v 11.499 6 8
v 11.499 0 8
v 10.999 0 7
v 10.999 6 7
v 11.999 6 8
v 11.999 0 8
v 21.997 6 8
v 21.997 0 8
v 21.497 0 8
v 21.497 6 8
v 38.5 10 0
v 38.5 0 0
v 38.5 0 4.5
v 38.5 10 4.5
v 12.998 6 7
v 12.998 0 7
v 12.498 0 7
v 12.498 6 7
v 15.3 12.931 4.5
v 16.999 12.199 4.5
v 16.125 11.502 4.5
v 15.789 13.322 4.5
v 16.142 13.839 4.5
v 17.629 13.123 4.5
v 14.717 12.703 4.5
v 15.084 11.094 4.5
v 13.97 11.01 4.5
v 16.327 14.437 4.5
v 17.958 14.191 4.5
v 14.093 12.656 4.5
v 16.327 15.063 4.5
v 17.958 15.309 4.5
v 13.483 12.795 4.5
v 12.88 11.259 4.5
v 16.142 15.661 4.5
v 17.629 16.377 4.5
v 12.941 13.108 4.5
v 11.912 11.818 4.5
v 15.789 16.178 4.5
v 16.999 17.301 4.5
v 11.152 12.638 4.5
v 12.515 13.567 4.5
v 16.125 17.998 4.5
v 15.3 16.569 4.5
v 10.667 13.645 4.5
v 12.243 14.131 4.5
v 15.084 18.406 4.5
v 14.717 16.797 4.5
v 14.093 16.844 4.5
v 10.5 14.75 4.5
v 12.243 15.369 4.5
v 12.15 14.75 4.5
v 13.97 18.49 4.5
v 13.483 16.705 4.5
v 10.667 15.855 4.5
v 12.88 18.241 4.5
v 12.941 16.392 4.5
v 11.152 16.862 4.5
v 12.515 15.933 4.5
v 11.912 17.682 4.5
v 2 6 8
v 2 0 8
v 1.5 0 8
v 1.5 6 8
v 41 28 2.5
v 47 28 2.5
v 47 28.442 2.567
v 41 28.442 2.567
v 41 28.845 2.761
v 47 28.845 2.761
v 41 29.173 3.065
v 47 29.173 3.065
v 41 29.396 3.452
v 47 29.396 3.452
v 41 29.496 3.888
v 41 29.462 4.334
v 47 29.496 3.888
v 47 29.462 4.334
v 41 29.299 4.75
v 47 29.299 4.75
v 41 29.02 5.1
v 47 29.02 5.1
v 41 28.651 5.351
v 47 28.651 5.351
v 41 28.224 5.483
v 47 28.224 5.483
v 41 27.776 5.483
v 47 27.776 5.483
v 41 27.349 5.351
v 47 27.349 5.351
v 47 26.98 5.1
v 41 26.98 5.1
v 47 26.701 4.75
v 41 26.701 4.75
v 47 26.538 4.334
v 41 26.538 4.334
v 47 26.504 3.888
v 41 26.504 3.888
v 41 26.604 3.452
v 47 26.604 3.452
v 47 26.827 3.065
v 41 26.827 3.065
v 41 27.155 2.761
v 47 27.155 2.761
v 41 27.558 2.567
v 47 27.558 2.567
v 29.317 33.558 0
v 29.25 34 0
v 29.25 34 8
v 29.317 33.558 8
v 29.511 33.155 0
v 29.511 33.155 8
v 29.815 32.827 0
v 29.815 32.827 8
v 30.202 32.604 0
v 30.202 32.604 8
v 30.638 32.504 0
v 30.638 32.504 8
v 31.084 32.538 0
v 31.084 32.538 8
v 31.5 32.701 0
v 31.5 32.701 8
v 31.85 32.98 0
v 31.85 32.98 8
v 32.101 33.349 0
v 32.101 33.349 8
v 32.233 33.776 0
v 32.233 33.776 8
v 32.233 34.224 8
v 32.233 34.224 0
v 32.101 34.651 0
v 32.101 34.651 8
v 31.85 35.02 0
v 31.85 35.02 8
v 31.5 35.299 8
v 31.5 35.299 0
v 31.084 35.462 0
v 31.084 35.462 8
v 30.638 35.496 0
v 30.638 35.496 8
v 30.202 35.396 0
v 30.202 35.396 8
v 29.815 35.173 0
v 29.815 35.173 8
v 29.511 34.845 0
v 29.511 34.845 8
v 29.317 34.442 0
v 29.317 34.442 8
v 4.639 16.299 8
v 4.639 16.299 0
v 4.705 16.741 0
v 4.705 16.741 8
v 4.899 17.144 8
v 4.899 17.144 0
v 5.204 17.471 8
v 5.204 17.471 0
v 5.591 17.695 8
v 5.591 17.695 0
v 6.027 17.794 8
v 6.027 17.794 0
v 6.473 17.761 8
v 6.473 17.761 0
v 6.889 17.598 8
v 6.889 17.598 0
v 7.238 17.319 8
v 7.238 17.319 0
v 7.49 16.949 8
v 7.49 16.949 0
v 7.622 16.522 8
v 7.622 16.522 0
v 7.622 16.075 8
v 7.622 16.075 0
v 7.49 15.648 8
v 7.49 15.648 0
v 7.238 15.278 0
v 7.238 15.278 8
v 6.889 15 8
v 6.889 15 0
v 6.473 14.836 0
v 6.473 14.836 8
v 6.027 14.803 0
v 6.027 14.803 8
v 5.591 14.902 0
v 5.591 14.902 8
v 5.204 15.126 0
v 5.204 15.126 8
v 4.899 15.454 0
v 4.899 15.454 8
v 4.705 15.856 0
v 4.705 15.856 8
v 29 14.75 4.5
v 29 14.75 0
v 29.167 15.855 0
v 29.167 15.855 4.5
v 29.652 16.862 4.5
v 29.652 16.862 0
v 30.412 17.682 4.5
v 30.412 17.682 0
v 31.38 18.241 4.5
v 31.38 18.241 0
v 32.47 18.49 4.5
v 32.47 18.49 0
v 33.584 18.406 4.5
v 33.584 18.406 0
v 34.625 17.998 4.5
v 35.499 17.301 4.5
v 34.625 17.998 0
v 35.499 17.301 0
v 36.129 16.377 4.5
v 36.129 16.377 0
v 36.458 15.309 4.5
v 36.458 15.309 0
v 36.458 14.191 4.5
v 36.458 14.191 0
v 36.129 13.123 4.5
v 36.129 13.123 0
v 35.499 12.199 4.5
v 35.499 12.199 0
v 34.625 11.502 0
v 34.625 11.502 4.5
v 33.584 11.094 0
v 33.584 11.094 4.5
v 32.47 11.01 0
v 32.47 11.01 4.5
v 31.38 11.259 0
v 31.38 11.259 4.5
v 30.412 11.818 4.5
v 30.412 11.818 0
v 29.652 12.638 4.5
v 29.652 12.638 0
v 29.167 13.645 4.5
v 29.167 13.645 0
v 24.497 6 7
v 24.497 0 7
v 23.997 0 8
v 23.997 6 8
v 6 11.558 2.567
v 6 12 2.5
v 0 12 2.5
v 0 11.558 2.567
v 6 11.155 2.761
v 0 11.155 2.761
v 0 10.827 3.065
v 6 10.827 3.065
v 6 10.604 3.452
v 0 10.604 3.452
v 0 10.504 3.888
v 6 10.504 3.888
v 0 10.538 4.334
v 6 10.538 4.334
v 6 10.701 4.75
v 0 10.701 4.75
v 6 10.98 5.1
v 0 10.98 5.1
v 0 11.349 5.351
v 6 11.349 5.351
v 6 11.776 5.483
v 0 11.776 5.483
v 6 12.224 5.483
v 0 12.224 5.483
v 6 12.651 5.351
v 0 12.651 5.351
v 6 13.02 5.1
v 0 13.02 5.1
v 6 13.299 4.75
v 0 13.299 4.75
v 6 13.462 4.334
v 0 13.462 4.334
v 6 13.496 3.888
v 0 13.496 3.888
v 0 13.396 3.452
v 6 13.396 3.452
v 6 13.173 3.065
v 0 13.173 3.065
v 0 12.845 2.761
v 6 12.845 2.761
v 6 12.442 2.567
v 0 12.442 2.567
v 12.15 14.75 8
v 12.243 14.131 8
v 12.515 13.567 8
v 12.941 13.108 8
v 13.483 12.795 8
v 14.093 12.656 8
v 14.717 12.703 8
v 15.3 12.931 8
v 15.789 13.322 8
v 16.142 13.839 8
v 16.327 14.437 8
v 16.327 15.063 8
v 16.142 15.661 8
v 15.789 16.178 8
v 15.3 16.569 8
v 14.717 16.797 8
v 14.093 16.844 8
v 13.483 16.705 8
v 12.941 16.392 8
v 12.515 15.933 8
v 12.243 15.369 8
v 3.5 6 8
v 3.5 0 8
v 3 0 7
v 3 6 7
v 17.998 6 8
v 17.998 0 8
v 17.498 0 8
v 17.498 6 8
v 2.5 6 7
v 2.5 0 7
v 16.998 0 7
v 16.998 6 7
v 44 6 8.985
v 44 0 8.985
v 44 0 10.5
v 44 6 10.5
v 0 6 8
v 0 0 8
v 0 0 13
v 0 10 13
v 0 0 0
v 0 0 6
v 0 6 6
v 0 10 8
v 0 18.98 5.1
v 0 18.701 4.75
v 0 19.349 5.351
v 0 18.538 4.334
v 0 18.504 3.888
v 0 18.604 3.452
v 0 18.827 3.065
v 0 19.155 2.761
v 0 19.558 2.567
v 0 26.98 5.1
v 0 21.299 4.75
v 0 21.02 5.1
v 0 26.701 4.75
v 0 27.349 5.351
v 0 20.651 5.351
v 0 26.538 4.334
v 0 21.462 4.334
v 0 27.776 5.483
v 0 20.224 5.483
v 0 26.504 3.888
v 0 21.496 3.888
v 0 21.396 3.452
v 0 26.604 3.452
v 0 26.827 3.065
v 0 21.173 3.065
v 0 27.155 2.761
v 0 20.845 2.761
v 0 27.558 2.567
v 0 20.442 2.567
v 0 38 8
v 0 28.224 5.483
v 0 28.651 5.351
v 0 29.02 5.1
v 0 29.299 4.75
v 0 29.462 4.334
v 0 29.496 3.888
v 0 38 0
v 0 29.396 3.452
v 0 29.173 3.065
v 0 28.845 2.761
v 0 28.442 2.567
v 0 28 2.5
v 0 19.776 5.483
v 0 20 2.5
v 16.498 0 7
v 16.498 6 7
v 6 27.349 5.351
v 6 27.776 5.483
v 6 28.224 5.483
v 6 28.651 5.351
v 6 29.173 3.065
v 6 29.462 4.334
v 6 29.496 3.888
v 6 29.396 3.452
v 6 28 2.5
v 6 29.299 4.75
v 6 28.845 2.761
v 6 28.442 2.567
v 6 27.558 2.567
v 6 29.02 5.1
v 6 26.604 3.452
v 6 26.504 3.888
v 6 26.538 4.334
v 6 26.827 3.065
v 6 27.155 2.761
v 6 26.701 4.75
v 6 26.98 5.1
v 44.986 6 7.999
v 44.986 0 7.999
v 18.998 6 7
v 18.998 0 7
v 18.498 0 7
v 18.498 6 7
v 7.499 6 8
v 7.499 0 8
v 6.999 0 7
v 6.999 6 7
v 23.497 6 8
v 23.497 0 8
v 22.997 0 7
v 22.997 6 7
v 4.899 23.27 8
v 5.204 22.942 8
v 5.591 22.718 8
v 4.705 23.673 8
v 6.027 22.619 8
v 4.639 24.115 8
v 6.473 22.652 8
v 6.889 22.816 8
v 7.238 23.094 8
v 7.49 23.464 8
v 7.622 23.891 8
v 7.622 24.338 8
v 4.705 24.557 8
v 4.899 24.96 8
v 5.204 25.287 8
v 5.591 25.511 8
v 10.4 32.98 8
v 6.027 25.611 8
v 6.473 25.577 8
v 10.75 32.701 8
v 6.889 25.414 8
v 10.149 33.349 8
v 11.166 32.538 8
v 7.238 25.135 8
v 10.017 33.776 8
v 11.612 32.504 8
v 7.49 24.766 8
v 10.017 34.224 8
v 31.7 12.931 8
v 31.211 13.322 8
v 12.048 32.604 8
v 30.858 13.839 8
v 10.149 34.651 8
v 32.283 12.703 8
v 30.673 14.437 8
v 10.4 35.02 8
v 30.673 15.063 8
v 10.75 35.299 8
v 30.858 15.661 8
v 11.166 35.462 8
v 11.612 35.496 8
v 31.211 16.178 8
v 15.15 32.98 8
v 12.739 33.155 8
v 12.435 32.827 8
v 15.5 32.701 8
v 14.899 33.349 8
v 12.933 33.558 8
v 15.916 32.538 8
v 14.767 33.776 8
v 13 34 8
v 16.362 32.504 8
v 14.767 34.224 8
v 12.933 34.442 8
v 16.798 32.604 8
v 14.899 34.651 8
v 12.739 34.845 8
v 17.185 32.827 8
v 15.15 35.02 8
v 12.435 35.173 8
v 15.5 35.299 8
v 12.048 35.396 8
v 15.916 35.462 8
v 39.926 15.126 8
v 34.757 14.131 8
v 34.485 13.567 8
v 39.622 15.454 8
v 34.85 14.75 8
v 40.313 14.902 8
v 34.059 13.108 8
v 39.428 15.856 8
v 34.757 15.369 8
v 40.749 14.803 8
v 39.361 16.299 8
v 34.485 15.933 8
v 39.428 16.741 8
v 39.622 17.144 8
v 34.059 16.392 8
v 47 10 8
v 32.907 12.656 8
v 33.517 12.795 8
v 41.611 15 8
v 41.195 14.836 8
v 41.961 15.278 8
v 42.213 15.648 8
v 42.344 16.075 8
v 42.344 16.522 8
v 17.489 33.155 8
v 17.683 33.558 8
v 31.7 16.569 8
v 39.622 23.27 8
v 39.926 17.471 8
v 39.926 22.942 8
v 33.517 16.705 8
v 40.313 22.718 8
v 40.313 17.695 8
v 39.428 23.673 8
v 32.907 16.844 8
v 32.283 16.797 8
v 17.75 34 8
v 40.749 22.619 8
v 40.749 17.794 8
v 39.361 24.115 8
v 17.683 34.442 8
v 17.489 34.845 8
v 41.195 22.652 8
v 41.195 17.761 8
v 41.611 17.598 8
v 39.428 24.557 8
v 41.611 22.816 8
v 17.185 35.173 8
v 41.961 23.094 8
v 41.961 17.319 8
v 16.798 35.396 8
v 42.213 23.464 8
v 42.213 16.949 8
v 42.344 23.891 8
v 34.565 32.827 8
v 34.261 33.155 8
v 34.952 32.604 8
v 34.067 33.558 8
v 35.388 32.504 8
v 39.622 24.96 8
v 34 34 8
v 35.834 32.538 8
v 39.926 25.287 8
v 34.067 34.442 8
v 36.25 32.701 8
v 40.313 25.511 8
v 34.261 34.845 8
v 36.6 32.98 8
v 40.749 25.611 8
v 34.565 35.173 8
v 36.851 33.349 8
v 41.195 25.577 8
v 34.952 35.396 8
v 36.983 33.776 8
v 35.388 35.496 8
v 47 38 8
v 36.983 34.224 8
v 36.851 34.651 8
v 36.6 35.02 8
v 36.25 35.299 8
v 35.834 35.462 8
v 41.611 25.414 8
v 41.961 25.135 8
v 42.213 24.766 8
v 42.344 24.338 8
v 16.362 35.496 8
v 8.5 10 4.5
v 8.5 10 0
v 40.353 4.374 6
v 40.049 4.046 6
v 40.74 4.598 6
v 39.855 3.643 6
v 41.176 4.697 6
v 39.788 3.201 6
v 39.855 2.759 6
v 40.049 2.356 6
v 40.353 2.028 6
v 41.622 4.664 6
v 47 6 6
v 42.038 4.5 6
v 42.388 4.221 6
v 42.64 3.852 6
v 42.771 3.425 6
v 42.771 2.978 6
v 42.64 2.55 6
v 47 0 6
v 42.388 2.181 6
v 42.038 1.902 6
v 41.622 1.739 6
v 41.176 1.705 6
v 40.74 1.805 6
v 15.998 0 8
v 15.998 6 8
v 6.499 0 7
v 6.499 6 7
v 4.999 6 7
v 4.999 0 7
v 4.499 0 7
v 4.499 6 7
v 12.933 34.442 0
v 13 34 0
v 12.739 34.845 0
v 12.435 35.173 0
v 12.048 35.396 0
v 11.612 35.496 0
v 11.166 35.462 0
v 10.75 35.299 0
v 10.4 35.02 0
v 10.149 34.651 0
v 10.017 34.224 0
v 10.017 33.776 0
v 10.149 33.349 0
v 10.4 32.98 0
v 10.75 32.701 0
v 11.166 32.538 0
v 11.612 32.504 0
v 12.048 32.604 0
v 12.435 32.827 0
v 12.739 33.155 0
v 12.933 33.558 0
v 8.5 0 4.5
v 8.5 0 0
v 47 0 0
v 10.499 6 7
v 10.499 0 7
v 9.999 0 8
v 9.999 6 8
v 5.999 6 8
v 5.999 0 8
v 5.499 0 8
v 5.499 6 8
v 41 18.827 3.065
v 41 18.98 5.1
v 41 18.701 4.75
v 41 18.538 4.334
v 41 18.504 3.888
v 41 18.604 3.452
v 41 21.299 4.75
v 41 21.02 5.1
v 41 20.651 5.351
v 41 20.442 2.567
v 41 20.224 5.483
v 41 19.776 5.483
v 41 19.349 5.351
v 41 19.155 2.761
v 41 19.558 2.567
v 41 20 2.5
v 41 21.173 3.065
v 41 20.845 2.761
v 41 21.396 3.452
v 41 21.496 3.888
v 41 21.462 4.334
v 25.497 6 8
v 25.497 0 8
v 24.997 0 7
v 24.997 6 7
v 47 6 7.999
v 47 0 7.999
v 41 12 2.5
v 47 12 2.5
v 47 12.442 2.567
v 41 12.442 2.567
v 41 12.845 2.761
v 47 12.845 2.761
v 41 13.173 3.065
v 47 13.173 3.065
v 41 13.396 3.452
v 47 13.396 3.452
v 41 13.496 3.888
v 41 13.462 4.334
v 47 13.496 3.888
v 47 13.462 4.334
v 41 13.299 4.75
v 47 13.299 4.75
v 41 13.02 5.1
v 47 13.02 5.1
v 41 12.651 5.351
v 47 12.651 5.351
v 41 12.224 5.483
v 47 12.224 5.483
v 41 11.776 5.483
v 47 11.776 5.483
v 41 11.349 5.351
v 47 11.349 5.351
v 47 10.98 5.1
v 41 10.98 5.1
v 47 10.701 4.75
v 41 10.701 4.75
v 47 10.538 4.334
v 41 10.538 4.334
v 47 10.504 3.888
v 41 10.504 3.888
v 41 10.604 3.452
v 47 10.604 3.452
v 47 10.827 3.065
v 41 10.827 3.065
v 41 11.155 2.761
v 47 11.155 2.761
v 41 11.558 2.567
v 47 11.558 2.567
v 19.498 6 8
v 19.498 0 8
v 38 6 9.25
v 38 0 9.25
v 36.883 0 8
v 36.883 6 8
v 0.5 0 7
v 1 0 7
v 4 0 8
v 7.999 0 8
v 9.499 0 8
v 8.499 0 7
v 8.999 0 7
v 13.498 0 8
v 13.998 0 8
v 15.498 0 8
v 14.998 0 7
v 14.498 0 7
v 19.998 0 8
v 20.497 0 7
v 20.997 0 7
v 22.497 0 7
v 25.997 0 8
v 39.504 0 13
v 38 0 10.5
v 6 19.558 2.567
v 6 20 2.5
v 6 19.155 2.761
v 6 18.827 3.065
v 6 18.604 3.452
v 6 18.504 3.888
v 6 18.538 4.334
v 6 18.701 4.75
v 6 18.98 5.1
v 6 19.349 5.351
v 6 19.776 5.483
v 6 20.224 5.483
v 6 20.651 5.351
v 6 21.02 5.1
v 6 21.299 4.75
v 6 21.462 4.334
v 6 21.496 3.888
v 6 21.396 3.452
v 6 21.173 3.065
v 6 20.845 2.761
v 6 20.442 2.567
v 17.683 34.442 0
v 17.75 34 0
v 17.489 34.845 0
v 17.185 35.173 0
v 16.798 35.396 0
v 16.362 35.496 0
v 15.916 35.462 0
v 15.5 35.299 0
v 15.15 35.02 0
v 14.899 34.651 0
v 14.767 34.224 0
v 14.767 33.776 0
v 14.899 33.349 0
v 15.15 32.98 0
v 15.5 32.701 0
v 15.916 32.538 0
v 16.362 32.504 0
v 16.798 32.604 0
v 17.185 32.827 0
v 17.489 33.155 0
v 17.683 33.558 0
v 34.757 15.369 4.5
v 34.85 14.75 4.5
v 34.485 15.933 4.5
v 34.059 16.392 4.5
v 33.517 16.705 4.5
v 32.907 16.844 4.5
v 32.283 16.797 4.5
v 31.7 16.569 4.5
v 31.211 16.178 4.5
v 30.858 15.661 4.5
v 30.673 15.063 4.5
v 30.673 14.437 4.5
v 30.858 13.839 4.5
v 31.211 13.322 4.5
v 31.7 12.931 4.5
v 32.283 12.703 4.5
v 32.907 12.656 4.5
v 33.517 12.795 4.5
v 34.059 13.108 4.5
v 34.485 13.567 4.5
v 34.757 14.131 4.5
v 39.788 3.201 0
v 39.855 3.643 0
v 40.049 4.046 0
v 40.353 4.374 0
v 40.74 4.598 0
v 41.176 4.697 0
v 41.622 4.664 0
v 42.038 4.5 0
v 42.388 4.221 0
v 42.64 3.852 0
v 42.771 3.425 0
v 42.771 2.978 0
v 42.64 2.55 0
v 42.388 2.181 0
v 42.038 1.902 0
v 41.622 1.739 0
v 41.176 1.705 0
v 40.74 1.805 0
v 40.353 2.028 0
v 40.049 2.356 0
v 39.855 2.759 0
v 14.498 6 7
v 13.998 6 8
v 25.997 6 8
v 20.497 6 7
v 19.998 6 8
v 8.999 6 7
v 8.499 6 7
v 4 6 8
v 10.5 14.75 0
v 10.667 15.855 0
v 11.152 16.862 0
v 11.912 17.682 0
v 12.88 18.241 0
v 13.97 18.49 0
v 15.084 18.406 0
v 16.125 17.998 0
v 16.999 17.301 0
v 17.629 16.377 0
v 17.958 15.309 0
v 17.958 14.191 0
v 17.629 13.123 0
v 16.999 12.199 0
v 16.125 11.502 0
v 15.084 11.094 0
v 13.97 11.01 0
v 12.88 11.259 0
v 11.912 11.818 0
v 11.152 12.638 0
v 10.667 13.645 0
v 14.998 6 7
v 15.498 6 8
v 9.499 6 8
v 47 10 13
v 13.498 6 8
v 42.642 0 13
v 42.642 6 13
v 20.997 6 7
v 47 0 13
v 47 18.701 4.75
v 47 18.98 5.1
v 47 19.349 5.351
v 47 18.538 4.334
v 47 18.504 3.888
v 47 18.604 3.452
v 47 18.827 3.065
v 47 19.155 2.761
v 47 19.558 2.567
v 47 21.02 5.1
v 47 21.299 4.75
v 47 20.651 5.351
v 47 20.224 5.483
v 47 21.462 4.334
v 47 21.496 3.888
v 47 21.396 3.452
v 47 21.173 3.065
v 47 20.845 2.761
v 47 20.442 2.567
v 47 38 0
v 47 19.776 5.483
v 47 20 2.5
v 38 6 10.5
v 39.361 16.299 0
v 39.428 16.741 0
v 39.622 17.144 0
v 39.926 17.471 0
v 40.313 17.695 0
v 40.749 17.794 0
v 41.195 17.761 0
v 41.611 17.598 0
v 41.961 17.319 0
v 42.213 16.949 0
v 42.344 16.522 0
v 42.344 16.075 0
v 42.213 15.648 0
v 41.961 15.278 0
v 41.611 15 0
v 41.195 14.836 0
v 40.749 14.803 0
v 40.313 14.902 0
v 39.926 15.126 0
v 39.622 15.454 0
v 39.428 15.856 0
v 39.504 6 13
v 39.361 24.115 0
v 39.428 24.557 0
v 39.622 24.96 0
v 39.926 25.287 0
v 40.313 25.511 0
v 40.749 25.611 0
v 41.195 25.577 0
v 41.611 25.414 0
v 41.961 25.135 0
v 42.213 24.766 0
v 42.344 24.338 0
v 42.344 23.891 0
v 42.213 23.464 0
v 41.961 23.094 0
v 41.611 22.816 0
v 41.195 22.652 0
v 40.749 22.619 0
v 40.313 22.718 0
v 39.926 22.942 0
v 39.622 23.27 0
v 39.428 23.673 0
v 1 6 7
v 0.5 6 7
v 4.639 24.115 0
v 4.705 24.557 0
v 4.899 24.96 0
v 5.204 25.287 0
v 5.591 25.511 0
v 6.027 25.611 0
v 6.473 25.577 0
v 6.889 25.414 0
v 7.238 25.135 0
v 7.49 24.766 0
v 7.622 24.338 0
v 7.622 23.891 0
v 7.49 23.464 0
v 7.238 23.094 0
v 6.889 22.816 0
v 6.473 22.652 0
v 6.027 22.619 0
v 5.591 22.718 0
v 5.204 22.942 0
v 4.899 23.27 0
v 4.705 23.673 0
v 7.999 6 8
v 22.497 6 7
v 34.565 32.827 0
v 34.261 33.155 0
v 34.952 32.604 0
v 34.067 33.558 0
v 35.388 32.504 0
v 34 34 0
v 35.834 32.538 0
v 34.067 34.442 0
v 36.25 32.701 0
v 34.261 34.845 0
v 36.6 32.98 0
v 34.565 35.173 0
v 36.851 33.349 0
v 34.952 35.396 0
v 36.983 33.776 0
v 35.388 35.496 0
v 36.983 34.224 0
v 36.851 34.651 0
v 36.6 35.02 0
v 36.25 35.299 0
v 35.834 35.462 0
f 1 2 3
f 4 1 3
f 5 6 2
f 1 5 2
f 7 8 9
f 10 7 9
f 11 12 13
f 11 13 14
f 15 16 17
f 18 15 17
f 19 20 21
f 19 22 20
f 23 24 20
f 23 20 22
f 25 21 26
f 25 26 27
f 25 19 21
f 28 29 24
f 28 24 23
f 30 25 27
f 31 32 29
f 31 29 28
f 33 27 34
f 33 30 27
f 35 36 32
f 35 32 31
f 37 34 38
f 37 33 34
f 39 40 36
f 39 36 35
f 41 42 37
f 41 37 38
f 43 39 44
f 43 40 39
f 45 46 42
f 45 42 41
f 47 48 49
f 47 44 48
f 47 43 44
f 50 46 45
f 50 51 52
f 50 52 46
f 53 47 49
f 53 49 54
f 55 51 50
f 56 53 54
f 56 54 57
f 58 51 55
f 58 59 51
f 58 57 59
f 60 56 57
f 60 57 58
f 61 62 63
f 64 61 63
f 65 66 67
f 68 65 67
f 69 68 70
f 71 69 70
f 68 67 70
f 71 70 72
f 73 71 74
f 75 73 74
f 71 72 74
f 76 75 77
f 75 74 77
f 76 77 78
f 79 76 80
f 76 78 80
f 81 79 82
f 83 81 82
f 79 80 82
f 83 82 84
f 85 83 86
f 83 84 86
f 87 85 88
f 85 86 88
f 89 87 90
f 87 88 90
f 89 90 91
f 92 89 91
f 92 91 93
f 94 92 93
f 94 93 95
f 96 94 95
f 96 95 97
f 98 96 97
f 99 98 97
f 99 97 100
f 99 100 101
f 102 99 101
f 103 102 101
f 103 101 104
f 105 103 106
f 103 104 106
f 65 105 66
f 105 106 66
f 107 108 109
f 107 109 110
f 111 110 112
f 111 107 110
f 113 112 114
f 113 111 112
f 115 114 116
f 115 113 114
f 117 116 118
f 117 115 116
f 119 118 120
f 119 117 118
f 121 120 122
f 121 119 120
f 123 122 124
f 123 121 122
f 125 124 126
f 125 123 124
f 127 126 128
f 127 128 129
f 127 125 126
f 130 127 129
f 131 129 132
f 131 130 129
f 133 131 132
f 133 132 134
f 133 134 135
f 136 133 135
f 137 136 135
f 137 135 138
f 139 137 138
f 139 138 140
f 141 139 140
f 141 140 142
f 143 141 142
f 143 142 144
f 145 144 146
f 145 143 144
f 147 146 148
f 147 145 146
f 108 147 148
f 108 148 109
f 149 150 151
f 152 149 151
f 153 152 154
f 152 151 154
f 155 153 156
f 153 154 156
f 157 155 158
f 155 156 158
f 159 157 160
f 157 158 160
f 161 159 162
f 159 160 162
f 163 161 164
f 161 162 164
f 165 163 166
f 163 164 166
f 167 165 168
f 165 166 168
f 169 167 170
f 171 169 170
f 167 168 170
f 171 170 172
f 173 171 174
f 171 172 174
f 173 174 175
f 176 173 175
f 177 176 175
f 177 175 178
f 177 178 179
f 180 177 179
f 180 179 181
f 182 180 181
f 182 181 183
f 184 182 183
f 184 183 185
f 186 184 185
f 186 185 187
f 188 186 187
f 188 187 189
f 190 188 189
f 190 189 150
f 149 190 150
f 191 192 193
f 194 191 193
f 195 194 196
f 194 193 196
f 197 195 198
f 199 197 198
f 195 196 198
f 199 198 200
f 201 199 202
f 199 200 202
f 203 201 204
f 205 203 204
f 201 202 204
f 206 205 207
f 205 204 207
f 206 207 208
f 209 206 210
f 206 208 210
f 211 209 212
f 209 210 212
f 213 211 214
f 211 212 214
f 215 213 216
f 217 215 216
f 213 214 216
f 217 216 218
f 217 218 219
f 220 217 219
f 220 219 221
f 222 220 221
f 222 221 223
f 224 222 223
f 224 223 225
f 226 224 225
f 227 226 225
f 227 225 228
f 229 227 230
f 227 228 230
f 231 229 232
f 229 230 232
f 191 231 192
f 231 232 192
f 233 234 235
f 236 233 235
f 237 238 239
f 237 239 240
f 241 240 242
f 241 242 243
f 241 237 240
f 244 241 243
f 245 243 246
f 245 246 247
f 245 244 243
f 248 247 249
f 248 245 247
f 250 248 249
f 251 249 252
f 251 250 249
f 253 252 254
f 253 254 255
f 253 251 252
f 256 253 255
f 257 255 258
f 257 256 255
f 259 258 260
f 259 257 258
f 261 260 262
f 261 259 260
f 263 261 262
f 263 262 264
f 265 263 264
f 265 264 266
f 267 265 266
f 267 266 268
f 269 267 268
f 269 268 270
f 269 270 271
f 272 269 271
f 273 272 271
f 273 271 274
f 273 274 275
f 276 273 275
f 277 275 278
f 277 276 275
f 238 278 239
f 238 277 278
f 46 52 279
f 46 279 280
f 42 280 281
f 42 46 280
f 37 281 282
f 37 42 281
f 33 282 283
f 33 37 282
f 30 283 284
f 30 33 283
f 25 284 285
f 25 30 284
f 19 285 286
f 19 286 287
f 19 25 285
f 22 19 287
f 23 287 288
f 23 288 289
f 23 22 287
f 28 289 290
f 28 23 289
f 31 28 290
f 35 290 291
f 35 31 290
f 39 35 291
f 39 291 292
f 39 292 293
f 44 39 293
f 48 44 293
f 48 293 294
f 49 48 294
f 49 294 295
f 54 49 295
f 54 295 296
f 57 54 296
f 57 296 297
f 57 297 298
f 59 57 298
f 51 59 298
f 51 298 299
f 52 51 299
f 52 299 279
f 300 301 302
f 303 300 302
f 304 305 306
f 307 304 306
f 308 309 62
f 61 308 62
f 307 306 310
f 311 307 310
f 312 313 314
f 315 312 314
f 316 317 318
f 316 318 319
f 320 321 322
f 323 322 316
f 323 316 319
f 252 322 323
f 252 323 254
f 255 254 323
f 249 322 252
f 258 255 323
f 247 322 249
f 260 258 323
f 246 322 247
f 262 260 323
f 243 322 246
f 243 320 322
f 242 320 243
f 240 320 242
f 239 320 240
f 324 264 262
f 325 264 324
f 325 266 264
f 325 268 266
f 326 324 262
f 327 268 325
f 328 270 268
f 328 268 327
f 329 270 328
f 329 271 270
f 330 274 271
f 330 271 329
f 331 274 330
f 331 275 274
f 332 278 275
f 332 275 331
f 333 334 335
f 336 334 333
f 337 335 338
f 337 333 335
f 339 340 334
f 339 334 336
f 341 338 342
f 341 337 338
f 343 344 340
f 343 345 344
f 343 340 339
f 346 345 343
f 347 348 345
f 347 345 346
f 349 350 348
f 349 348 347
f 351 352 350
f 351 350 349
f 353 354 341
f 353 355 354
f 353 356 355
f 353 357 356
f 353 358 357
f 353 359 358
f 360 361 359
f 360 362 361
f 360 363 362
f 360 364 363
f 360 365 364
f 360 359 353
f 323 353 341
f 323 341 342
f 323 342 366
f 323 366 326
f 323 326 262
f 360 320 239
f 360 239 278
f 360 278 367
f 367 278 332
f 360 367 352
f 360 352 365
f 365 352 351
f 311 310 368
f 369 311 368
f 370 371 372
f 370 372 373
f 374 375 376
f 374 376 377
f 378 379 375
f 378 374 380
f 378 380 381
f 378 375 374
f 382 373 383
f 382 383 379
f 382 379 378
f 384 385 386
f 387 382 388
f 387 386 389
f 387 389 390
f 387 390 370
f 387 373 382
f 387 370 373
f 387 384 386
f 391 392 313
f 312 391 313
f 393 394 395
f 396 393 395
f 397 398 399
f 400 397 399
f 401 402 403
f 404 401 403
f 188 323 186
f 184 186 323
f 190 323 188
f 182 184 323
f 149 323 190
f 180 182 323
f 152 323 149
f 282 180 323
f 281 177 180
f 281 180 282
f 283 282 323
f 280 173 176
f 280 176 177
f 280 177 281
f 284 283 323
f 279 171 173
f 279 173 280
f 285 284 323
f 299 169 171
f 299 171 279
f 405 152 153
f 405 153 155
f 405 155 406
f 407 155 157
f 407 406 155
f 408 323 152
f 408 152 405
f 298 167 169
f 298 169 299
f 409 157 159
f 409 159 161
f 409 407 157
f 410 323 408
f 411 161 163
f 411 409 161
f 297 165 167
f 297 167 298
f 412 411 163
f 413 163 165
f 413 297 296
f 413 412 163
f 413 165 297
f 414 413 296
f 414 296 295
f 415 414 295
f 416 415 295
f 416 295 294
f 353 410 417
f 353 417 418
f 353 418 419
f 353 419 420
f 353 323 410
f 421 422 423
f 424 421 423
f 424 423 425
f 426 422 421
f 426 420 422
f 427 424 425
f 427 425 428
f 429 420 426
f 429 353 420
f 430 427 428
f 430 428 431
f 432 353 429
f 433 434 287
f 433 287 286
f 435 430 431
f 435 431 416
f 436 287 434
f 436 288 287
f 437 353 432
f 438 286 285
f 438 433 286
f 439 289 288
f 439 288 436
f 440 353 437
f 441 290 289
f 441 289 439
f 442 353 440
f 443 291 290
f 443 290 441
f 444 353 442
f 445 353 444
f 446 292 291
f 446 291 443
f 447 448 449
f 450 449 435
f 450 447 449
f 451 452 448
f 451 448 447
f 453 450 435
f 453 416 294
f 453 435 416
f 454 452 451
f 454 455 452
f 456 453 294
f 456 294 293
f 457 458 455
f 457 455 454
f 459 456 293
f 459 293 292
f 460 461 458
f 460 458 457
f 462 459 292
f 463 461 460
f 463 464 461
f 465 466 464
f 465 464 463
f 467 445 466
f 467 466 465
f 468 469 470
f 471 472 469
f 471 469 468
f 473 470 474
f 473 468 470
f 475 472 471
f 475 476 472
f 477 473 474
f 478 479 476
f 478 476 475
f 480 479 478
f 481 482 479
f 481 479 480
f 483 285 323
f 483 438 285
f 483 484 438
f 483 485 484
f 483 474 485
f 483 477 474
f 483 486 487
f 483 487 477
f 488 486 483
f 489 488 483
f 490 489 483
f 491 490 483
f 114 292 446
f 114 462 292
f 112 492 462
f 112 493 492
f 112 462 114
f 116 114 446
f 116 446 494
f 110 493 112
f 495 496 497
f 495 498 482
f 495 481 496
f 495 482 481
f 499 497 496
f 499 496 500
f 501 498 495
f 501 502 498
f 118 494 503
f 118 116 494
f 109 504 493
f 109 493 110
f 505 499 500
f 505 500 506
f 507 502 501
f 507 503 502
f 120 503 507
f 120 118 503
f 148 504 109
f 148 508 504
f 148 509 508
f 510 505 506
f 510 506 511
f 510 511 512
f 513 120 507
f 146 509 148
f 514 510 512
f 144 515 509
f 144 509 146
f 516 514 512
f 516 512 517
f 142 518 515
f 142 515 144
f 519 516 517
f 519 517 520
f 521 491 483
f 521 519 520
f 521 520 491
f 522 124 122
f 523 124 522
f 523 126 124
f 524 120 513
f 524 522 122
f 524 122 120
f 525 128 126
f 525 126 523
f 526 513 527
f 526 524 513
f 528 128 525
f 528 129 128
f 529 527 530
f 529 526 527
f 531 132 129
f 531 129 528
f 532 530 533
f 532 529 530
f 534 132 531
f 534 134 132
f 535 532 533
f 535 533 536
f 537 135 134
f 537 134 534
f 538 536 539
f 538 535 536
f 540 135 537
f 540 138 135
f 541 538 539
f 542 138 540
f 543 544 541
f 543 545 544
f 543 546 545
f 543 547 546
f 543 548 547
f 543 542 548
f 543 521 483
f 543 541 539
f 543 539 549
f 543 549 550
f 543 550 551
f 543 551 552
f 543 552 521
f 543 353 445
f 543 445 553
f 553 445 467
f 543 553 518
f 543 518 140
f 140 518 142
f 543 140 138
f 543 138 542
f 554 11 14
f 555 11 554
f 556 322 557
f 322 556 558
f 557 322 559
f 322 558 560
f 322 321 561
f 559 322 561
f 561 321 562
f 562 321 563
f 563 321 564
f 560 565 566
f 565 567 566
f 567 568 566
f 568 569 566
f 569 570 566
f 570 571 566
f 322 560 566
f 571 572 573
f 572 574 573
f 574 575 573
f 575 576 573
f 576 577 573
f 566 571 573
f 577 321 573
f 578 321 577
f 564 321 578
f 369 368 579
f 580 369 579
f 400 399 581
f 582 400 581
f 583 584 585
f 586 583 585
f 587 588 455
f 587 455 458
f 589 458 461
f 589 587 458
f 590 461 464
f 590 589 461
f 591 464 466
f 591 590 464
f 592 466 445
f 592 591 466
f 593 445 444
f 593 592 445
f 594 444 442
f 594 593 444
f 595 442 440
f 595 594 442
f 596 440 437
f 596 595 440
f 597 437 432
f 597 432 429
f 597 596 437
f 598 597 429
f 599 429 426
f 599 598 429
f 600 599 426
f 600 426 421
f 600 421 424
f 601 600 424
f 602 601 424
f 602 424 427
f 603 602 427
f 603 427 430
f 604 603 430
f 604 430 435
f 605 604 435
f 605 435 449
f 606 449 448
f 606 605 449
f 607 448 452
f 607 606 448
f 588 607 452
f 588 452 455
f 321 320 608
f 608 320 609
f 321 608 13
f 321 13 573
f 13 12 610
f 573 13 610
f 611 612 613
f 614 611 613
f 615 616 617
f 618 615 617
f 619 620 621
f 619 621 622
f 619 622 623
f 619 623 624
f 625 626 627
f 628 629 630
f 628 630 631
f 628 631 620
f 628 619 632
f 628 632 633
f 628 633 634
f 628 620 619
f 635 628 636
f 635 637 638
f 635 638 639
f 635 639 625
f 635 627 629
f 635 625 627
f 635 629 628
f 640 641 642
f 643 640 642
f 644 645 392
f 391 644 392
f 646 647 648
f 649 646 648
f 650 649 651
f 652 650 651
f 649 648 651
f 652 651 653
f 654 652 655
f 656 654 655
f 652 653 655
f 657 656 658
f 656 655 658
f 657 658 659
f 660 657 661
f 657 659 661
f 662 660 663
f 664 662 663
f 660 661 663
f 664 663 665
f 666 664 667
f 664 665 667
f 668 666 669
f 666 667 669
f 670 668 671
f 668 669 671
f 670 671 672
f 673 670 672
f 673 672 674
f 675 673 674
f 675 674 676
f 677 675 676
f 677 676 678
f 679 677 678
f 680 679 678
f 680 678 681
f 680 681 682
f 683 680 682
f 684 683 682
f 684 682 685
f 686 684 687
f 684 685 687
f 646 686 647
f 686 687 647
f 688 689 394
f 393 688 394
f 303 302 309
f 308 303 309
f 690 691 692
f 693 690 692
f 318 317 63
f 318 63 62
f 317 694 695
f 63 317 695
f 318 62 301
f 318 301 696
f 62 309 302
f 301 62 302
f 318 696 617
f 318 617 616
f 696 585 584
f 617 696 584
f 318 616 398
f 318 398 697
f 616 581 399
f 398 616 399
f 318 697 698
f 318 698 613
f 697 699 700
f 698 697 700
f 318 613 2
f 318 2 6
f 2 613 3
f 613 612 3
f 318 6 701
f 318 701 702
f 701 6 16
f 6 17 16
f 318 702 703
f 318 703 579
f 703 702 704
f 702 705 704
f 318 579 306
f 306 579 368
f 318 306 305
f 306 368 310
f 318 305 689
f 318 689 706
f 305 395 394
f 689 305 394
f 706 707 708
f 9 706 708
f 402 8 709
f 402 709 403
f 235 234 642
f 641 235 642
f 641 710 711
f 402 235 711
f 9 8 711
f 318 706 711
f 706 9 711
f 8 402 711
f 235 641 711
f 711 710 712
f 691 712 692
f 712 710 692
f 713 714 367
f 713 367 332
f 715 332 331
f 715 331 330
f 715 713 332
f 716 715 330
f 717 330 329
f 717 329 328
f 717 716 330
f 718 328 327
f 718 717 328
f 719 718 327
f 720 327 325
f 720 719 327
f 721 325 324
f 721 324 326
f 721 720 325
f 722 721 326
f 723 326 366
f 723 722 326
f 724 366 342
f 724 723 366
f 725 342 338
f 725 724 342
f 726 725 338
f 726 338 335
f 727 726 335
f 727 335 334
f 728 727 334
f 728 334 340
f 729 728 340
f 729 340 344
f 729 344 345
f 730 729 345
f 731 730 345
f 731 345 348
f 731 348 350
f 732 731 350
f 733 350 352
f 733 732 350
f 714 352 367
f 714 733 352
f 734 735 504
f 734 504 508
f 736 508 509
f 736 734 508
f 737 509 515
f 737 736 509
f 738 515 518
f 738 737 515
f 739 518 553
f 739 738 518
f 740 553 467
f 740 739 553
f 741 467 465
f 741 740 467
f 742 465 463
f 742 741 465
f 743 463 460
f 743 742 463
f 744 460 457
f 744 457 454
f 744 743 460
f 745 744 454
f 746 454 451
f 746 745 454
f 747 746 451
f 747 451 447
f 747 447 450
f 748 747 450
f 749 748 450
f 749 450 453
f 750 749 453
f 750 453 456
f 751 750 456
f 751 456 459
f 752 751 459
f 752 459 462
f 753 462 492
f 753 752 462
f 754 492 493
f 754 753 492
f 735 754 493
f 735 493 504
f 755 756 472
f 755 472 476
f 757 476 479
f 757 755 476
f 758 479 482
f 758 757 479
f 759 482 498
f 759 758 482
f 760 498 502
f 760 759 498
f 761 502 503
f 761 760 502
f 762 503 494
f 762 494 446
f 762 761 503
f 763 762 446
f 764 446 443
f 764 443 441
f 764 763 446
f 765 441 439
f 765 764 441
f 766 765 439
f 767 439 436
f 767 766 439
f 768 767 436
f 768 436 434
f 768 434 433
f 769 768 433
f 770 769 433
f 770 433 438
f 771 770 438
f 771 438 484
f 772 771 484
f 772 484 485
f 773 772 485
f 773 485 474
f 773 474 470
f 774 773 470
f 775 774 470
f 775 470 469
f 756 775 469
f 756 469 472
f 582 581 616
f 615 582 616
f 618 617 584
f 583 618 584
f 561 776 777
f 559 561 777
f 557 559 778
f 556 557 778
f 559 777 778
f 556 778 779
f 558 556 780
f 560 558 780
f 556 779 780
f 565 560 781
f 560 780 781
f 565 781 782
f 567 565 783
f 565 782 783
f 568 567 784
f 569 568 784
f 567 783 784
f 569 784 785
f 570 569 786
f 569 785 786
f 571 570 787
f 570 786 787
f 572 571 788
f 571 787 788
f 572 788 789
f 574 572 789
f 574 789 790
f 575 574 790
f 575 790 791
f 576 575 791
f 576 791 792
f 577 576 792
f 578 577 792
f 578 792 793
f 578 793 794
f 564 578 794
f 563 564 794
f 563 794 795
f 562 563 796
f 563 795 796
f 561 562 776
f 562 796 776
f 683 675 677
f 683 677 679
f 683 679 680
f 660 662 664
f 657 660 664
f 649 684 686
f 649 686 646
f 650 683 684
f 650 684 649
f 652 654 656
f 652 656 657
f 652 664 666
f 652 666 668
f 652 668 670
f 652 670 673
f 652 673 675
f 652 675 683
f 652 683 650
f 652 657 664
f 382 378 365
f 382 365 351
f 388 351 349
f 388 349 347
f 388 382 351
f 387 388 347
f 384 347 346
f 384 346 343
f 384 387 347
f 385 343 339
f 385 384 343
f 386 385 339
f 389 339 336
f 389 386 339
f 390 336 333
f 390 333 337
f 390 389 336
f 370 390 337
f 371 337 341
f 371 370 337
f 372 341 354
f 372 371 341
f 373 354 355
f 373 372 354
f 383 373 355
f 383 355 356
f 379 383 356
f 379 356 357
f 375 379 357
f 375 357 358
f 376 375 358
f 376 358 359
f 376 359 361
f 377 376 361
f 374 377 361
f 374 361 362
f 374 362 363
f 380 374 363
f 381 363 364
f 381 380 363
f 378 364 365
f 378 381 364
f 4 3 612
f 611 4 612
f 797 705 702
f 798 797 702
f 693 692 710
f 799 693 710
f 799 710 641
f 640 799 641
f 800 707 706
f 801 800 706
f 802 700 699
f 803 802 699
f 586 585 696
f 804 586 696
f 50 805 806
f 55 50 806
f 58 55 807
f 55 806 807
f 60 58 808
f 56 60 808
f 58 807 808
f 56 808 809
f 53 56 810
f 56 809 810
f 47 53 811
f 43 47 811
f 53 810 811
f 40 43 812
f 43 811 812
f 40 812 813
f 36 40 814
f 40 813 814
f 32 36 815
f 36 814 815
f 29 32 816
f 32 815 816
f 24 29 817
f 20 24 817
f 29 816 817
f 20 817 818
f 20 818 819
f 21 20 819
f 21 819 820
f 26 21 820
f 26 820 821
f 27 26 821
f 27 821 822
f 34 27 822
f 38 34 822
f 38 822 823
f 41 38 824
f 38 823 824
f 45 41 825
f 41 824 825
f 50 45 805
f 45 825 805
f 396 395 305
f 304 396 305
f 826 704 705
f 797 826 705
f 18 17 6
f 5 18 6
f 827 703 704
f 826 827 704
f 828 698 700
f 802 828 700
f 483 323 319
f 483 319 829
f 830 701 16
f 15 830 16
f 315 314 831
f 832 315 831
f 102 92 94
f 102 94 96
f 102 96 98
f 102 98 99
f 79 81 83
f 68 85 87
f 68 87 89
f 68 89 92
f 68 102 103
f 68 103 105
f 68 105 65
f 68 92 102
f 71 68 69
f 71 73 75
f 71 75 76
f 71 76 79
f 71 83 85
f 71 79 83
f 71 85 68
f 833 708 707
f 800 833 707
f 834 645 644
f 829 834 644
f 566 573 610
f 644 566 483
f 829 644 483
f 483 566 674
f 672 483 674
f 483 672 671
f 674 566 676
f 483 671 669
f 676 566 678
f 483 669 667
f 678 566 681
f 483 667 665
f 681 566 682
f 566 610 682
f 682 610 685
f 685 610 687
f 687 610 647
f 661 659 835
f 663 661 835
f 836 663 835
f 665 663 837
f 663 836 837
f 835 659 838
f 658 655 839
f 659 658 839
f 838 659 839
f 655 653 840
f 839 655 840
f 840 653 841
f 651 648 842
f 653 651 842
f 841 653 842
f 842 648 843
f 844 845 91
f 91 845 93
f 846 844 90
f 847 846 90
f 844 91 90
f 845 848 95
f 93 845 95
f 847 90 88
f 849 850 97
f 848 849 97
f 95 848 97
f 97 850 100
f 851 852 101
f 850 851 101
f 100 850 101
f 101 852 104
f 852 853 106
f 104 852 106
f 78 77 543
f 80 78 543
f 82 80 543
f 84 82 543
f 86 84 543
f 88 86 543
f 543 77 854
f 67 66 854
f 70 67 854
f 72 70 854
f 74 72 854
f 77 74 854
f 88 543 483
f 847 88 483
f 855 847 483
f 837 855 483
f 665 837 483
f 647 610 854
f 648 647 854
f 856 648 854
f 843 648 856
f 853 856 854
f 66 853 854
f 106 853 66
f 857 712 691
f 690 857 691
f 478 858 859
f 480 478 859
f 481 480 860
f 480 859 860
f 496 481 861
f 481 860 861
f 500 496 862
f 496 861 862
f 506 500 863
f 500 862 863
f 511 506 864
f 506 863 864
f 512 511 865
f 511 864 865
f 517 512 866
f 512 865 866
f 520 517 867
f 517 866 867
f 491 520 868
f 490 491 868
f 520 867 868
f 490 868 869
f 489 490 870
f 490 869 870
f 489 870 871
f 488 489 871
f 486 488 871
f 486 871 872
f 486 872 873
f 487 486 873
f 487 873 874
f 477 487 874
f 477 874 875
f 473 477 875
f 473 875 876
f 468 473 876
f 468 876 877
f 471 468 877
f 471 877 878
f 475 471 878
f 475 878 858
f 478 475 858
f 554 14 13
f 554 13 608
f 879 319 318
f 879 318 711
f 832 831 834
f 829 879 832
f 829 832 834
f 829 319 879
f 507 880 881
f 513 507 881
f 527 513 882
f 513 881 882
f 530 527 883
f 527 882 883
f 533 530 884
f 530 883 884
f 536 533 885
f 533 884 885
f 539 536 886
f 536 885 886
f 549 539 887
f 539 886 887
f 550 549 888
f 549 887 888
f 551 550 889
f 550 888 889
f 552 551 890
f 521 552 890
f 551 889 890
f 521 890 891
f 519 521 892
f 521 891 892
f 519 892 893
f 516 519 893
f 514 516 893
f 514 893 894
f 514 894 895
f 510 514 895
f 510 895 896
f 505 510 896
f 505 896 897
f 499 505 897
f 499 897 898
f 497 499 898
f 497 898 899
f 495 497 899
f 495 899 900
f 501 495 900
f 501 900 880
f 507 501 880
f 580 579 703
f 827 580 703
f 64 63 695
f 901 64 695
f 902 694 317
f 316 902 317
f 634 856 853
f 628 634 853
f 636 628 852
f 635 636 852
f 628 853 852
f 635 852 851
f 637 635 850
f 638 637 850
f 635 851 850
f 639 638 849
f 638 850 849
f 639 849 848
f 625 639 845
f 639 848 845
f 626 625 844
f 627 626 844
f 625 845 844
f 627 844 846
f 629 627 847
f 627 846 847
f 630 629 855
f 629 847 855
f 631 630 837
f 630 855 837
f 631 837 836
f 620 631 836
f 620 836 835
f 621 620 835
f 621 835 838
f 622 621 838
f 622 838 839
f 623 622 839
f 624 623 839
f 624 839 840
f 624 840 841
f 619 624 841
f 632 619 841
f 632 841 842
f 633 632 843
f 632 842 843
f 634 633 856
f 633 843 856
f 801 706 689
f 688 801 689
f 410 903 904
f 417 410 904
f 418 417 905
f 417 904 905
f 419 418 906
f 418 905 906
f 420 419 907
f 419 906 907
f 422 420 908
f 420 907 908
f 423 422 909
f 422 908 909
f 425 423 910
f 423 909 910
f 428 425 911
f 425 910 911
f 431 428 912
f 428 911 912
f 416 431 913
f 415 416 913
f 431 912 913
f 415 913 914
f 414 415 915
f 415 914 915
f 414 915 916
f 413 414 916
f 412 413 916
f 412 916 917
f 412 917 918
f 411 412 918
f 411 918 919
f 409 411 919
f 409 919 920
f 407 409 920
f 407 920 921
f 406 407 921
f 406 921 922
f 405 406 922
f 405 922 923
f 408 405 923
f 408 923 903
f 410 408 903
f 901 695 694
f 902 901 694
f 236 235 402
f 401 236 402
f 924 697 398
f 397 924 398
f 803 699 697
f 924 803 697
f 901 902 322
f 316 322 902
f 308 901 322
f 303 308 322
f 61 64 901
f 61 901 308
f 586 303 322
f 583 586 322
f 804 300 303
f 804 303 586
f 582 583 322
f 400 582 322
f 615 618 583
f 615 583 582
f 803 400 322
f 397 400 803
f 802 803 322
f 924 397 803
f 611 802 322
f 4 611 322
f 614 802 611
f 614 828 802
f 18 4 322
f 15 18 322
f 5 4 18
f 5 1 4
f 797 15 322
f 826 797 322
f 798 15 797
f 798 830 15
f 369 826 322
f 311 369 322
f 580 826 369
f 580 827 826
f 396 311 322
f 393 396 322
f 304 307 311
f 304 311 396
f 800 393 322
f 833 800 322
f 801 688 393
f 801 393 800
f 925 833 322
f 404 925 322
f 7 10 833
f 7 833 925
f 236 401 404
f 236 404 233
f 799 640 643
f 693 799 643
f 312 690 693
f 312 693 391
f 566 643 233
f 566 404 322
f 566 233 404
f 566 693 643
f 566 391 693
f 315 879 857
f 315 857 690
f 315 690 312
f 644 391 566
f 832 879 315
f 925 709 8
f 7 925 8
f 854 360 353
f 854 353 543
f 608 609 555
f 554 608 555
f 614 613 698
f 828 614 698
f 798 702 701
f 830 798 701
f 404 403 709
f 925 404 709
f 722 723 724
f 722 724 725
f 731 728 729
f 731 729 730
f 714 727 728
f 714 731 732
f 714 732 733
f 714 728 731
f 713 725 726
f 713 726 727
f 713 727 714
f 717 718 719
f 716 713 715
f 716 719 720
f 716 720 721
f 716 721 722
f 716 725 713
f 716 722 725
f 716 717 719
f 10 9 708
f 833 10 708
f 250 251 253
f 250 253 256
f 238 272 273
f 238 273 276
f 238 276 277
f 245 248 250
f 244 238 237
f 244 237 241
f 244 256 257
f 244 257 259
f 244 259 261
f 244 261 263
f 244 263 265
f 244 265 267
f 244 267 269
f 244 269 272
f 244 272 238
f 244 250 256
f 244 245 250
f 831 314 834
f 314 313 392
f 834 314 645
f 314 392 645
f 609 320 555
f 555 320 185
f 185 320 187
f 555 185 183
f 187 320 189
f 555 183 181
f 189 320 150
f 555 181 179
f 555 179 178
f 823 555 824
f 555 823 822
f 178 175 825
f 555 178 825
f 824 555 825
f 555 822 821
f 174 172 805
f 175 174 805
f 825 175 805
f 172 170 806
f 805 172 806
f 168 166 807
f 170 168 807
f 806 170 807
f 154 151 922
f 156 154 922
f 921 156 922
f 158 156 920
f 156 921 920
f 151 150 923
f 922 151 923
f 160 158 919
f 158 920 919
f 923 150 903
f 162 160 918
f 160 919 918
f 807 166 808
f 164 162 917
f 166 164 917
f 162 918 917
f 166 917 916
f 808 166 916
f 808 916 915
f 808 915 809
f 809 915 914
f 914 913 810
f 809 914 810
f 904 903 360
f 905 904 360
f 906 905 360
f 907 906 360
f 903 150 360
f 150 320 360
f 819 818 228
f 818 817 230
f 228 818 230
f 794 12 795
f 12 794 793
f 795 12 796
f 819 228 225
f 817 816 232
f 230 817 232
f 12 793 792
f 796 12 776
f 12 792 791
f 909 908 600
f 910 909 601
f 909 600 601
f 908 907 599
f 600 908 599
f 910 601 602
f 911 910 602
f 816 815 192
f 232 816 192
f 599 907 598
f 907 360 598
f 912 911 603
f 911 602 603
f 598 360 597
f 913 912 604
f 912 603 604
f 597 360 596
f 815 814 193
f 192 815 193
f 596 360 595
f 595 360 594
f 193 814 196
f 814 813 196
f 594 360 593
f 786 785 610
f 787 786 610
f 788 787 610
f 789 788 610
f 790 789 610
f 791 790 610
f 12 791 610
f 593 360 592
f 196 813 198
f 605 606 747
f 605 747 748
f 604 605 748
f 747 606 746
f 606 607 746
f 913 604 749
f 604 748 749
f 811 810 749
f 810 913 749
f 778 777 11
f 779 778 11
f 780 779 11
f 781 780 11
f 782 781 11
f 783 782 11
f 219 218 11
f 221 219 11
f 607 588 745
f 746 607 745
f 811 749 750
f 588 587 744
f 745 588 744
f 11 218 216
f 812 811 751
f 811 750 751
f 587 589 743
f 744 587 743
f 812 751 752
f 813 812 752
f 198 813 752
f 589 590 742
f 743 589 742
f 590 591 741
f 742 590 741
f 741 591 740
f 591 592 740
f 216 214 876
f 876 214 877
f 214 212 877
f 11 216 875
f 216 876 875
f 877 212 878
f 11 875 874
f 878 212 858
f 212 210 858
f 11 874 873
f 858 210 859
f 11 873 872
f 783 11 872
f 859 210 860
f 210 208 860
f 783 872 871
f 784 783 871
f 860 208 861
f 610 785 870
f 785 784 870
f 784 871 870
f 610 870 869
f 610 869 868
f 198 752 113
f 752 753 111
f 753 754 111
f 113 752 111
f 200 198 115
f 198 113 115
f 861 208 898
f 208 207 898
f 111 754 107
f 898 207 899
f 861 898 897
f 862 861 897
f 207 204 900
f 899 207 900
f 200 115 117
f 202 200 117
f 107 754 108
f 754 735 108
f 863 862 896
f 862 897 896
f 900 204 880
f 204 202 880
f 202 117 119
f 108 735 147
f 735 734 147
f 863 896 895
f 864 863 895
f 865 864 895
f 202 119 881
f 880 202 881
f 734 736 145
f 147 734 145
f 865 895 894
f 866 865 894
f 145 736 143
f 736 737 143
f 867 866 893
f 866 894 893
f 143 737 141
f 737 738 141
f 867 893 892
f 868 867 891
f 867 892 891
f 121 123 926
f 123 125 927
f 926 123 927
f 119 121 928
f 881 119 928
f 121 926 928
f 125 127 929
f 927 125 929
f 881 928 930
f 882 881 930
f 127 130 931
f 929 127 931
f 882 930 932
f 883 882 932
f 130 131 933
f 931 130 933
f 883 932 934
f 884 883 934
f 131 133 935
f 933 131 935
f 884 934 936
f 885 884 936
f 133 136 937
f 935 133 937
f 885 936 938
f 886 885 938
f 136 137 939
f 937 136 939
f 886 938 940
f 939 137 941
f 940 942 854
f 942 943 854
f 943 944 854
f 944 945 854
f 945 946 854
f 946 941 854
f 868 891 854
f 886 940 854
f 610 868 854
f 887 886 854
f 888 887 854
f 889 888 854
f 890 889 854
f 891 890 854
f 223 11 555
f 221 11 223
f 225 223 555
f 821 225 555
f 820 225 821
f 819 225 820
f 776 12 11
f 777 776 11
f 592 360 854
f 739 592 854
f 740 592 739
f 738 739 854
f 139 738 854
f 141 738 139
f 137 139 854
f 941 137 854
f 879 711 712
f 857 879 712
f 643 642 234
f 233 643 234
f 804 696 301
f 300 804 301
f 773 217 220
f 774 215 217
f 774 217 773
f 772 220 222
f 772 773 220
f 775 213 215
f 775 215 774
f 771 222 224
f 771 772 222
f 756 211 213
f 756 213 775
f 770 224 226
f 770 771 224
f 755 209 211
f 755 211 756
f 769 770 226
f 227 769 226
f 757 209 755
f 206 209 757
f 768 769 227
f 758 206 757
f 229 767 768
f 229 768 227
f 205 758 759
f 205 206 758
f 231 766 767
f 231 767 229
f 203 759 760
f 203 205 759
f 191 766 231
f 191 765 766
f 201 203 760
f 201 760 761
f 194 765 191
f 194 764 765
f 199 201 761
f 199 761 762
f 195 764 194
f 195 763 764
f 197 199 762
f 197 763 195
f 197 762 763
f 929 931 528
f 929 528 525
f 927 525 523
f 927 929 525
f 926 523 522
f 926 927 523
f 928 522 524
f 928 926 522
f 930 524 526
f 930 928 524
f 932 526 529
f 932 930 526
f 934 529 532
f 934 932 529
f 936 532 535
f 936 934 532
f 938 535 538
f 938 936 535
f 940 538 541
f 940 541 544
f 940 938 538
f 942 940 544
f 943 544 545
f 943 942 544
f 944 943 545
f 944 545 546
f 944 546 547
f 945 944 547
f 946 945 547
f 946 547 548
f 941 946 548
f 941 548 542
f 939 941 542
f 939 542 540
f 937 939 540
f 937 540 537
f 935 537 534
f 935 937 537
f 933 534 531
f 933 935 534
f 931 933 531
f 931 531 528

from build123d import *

# Parameters (mm, degrees)
SKETCH_1_W          = 47
SKETCH_1_H          = 38
SKETCH_1_R          = 1.5
SKETCH_1_R_2        = 2.1
EXTRUDE_1_DEPTH     = 8
SKETCH_2_R          = 3.75
SKETCH_2_W          = 30
SKETCH_2_H          = 10
CUT_EXTRUDE_1_DEPTH = 4.5
SKETCH_3_W          = 47
SKETCH_3_H          = 10
EXTRUDE_2_DEPTH     = 5
CUT_EXTRUDE_2_DEPTH = 6
SKETCH_5_R          = 1.5
CUT_EXTRUDE_3_DEPTH = 6
SKETCH_6_R          = 1.5
CUT_EXTRUDE_4_DEPTH = 6
CUT_EXTRUDE_START   = -6
SKETCH_7_R          = 1.5
CUT_EXTRUDE_5_DEPTH = 6
SKETCH_8_R          = 1.5
CUT_EXTRUDE_6_DEPTH = 62.822326064


with BuildPart() as part:
    # 草图1 → 凸台-拉伸1 (new body)
    with BuildSketch(Plane.XY):
        with Locations((23.5, 19)):
            Rectangle(SKETCH_1_W, SKETCH_1_H)
        with Locations((16.25, 34)):
            Circle(SKETCH_1_R, mode=Mode.SUBTRACT)
        with Locations((30.75, 34)):
            Circle(SKETCH_1_R, mode=Mode.SUBTRACT)
        with Locations((32.75, 14.75)):
            Circle(SKETCH_1_R_2, mode=Mode.SUBTRACT)
        with Locations((14.25, 14.75)):
            Circle(SKETCH_1_R_2, mode=Mode.SUBTRACT)
        with Locations((11.5, 34)):
            Circle(SKETCH_1_R, mode=Mode.SUBTRACT)
        with Locations((35.5, 34)):
            Circle(SKETCH_1_R, mode=Mode.SUBTRACT)
    extrude(amount=EXTRUDE_1_DEPTH)

    # 草图2 → 切除-拉伸1 (cut)
    with BuildSketch(Plane(origin=(0, 0, 0), x_dir=(-1, 0, 0), z_dir=(0, 0, -1))):
        with Locations((-32.75, 14.75)):
            Circle(SKETCH_2_R)
        with Locations((-14.25, 14.75)):
            Circle(SKETCH_2_R)
        with Locations((-23.5, 5)):
            Rectangle(SKETCH_2_W, SKETCH_2_H)
    extrude(amount=-CUT_EXTRUDE_1_DEPTH, mode=Mode.SUBTRACT)

    # 草图3 → 凸台-拉伸2 (add)
    with BuildSketch(Plane.XY.offset(8)):
        with Locations((23.5, 5)):
            Rectangle(SKETCH_3_W, SKETCH_3_H)
    extrude(amount=EXTRUDE_2_DEPTH)

    # 草图4 → 切除-拉伸2 (cut)
    with BuildSketch(Plane.XZ):
        Polygon((0.499880505, 7), (0, 8), (0, 6), (47, 6), (47, 7.999217306), (44.9861953, 7.999292351), (44, 8.985487652), (44, 10.499664551), (42.641699926, 13), (39.504118259, 13), (38, 10.499670662), (38, 9.249505993), (36.882697476, 7.999594333), (25.996893132, 8), (25.496893132, 8), (24.997012627, 7), (24.497012627, 7), (23.997132122, 8), (23.497132122, 8), (22.997251617, 7), (22.497251617, 7), (21.997371111, 8), (21.497371111, 8), (20.997490606, 7), (20.497490606, 7), (19.997610101, 8), (19.497610101, 8), (18.997729596, 7), (18.497729596, 7), (17.997849091, 8), (17.497849091, 8), (16.997968586, 7), (16.497968586, 7), (15.998088081, 8), (15.498088081, 8), (14.998207576, 7), (14.498207576, 7), (13.998327071, 8), (13.498327071, 8), (12.998446566, 7), (12.498446566, 7), (11.998566061, 8), (11.498566061, 8), (10.998685556, 7), (10.498685556, 7), (9.998805051, 8), (9.498805051, 8), (8.998924546, 7), (8.498924546, 7), (7.999044041, 8), (7.499044041, 8), (6.999163535, 7), (6.499163535, 7), (5.99928303, 8), (5.49928303, 8), (4.999402525, 7), (4.499402525, 7), (3.99952202, 8), (3.49952202, 8), (2.999641515, 7), (2.499641515, 7), (1.99976101, 8), (1.49976101, 8), (0.999880505, 7), align=None)
    extrude(amount=-CUT_EXTRUDE_2_DEPTH, mode=Mode.SUBTRACT)

    # 草图5 → 切除-拉伸3 (cut)
    with BuildSketch(Plane(origin=(0, 0, 0), x_dir=(-1, 0, 0), z_dir=(0, 0, -1))):
        with Locations((-41.288047011, 3.201203266)):
            Circle(SKETCH_5_R)
    extrude(amount=-CUT_EXTRUDE_3_DEPTH, mode=Mode.SUBTRACT)

    # 草图6 → 切除-拉伸4 (cut)
    with BuildSketch(Plane(origin=(47, 0, 0), x_dir=(0, 0, -1), z_dir=(1, 0, 0))):
        with Locations((-4, 12)):
            Circle(SKETCH_6_R)
        with Locations((-4, 20)):
            Circle(SKETCH_6_R)
        with Locations((-4, 28)):
            Circle(SKETCH_6_R)
    extrude(amount=-CUT_EXTRUDE_4_DEPTH, mode=Mode.SUBTRACT)

    # 草图7 → 切除-拉伸5 (cut)
    with BuildSketch(Plane.ZY.offset(CUT_EXTRUDE_START)):
        with Locations((4, 12)):
            Circle(SKETCH_7_R)
        with Locations((4, 20)):
            Circle(SKETCH_7_R)
        with Locations((4, 28)):
            Circle(SKETCH_7_R)
    extrude(amount=CUT_EXTRUDE_5_DEPTH, mode=Mode.SUBTRACT)

    # 草图8 → 切除-拉伸6 (cut, through all)
    with BuildSketch(Plane(origin=(0, 0, 0), x_dir=(-1, 0, 0), z_dir=(0, 0, -1))):
        with Locations((-40.861215873, 16.298578495)):
            Circle(SKETCH_8_R)
        with Locations((-40.861215873, 24.11472755)):
            Circle(SKETCH_8_R)
        with Locations((-6.138784127, 16.298578495)):
            Circle(SKETCH_8_R)
        with Locations((-6.138784127, 24.11472755)):
            Circle(SKETCH_8_R)
    extrude(amount=-CUT_EXTRUDE_6_DEPTH, mode=Mode.SUBTRACT)


solid = part.part
